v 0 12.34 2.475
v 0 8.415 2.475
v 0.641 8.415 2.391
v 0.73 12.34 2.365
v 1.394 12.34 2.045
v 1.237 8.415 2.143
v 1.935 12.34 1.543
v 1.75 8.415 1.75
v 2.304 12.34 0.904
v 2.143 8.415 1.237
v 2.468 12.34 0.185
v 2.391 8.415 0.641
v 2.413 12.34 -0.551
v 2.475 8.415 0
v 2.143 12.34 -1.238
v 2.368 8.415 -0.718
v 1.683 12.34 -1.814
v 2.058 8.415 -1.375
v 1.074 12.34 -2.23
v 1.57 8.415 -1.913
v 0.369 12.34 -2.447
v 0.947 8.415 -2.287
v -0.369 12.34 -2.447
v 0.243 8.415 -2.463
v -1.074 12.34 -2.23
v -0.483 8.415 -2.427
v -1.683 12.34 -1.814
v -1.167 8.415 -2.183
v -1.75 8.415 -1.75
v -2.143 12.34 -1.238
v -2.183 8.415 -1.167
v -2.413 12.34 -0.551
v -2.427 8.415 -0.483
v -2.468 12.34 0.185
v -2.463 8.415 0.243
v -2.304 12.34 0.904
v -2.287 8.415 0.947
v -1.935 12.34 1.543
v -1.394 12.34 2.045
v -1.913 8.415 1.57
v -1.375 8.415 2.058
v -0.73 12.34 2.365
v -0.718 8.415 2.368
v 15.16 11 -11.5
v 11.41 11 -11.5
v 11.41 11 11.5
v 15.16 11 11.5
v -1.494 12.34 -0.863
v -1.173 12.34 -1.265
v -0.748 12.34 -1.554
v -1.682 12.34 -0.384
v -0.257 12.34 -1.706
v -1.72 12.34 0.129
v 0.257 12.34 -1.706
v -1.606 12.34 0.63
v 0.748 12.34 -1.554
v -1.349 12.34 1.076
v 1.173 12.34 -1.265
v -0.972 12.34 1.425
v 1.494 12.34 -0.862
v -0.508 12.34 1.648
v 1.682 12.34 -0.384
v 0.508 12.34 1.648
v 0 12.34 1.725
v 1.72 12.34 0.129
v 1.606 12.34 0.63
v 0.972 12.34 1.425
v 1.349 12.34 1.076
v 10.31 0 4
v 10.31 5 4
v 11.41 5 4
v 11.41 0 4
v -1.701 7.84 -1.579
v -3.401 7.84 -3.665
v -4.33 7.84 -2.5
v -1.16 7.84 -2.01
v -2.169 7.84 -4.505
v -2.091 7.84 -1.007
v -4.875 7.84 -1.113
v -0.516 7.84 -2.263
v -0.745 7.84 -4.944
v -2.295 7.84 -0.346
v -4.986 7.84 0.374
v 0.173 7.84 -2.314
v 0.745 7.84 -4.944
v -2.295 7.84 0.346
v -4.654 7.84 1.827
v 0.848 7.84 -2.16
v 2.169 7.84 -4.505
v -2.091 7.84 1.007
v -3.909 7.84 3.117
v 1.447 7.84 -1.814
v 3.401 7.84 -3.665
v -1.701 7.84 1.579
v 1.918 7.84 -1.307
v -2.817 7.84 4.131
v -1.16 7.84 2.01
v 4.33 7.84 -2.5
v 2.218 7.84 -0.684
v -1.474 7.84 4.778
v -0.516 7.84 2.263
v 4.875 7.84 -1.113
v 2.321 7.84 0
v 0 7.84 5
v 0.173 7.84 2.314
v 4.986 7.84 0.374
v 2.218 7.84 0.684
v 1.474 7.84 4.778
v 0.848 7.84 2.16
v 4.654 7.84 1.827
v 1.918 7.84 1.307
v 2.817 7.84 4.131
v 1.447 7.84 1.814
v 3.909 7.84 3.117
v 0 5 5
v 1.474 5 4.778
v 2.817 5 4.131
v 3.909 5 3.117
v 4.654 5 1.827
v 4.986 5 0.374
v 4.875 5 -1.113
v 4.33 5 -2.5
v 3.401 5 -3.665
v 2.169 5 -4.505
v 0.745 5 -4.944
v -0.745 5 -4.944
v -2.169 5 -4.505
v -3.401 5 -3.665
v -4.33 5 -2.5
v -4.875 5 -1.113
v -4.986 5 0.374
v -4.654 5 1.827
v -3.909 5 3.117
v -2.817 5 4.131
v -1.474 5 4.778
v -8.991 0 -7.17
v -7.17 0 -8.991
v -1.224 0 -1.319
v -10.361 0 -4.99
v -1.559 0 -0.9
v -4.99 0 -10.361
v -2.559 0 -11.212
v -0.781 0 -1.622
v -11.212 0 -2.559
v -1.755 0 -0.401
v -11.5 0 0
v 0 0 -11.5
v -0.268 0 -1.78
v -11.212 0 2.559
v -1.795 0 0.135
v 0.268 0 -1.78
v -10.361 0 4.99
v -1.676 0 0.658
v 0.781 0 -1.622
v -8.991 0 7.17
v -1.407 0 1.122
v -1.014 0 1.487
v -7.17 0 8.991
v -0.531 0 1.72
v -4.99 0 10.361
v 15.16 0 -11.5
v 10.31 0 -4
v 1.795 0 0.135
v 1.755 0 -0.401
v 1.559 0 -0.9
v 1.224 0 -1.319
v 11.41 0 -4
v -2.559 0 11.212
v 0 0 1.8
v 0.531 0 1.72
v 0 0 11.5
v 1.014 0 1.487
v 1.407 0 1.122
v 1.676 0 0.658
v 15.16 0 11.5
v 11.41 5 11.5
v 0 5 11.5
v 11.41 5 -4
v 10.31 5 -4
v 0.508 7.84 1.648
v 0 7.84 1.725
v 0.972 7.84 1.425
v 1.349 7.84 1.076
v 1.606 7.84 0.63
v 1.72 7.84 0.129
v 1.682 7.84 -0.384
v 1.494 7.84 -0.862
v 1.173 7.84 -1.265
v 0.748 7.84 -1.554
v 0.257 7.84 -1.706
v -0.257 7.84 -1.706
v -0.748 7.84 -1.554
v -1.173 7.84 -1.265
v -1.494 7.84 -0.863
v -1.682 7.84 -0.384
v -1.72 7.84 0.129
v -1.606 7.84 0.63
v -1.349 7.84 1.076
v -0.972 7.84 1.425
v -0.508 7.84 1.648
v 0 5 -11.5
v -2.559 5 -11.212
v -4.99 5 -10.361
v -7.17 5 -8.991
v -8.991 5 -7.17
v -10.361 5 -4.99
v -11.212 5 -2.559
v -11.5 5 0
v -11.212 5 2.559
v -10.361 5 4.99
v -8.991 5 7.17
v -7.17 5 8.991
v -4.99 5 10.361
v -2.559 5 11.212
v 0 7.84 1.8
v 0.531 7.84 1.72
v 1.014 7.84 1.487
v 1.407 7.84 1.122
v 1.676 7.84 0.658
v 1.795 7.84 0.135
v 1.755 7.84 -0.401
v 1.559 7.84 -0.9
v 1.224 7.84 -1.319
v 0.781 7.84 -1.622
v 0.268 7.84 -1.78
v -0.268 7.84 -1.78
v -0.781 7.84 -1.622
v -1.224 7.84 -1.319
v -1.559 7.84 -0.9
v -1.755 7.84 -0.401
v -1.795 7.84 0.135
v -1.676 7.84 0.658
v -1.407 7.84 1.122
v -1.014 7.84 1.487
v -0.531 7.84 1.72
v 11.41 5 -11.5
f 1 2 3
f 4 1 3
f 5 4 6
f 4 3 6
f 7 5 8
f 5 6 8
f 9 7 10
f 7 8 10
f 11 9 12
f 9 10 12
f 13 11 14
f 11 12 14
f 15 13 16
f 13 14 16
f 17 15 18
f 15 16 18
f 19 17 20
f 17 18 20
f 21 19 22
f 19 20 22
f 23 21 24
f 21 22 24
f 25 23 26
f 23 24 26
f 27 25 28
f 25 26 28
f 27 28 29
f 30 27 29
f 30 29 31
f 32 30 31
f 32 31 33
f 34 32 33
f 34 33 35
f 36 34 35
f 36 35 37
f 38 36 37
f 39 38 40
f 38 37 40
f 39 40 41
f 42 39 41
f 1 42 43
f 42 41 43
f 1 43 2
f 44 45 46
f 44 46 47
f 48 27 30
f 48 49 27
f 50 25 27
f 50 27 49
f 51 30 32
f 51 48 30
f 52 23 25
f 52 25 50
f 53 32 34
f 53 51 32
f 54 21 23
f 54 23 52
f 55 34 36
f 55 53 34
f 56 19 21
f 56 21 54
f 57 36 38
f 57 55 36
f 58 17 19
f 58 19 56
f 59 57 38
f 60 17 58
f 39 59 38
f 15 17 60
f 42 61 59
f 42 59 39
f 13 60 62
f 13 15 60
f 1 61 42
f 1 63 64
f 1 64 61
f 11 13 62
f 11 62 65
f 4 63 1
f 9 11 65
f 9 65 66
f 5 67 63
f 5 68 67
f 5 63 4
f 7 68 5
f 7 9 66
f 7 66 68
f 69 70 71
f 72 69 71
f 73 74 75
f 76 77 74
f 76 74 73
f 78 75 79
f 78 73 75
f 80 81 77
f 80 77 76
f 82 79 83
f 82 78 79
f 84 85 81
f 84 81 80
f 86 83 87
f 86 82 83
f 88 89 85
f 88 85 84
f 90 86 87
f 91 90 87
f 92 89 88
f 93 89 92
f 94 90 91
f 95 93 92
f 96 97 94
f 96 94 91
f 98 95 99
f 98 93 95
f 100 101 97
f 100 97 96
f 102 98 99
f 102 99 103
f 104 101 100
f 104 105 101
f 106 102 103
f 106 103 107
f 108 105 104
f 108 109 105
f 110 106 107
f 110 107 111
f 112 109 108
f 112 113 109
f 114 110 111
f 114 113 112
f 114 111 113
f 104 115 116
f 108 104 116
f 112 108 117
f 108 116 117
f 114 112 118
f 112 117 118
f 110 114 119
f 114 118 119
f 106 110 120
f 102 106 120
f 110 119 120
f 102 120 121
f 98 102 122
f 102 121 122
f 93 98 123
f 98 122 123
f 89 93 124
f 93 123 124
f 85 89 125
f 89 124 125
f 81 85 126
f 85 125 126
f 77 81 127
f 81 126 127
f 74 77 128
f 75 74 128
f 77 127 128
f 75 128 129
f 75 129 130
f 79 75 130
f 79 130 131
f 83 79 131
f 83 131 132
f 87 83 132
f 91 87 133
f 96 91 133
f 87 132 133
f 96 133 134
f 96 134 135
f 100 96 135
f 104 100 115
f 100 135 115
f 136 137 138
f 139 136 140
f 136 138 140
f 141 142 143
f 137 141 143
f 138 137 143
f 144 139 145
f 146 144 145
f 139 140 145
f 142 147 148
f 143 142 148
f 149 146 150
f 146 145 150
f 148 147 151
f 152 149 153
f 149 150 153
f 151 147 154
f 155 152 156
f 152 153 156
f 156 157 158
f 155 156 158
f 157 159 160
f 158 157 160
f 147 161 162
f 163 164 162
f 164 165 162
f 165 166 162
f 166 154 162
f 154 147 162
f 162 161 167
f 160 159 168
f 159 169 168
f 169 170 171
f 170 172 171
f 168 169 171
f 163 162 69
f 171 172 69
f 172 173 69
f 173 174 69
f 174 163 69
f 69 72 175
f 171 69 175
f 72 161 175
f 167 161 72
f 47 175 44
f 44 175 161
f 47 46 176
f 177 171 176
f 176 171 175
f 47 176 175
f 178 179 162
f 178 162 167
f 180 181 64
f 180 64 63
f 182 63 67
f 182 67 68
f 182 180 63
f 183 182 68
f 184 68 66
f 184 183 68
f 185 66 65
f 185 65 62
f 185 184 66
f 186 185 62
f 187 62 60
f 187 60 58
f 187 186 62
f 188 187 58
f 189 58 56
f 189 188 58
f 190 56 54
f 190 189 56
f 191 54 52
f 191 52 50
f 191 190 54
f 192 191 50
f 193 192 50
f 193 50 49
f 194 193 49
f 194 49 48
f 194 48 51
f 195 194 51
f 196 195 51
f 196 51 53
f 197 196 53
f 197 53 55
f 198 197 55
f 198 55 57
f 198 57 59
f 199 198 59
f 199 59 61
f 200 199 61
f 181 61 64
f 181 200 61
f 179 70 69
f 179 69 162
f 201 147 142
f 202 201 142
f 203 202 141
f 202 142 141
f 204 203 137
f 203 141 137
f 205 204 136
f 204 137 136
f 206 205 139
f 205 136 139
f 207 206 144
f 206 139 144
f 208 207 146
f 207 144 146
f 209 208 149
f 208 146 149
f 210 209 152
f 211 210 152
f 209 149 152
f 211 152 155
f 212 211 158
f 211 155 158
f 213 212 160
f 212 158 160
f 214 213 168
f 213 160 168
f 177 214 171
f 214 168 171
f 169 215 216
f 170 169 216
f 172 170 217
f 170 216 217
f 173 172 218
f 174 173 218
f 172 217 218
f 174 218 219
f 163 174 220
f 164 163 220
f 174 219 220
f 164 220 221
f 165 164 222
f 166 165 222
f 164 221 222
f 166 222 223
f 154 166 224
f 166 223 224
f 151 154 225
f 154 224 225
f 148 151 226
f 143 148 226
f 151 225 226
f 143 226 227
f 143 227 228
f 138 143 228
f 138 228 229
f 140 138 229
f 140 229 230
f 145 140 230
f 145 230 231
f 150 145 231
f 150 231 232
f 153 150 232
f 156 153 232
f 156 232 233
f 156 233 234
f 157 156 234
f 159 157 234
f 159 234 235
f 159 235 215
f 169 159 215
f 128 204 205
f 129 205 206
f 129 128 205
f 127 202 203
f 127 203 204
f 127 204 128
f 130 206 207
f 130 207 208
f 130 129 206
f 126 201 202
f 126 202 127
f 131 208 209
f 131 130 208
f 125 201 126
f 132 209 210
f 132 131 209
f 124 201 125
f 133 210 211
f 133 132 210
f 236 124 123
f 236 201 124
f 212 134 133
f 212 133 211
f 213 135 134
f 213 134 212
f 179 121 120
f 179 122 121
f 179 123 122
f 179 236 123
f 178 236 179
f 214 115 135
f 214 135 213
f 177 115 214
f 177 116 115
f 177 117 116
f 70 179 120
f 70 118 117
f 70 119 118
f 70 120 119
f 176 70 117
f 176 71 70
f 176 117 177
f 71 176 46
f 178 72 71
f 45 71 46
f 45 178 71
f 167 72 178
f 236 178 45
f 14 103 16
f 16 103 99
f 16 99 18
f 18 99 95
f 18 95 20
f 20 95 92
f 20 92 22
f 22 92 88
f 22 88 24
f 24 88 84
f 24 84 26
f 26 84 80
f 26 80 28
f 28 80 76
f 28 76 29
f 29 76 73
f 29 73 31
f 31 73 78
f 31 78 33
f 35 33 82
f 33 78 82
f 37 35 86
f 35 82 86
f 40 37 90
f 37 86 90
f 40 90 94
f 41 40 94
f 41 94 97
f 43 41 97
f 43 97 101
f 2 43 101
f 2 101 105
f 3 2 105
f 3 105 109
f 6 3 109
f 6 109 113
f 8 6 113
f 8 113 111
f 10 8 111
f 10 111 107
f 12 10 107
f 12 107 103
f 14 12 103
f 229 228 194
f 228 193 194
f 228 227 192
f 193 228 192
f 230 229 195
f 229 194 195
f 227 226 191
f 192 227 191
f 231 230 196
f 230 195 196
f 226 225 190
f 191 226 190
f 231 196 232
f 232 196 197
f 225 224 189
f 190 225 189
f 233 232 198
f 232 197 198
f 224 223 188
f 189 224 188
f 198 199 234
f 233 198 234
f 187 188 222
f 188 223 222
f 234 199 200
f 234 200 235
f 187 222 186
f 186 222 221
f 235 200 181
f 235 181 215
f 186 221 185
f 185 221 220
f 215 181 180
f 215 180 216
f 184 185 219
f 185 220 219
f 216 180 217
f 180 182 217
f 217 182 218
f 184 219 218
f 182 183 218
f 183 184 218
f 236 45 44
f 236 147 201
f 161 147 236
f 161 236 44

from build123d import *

# Parameters (mm, degrees)
SKETCH1_R           = 11.5
BOSS_EXTRUDE1_DEPTH = 5
SKETCH2_R           = 5
BOSS_EXTRUDE2_DEPTH = 2.84
SKETCH3_R           = 2.475
SKETCH3_R_2         = 1.725
BOSS_EXTRUDE3_DEPTH = 4.5
SKETCH4_R           = 1.8
CUT_EXTRUDE1_DEPTH  = 8.84
SKETCH5_OUTSIDE_W   = 33.03
SKETCH5_OUTSIDE_H   = 33.03
SKETCH5_OUTSIDE_R   = 2.320799334
CUT_EXTRUDE2_DEPTH  = 2
CUT_EXTRUDE2_DRAFT  = 15
BOSS_EXTRUDE4_DEPTH = 5
SKETCH7_W           = 1.1
SKETCH7_H           = 8
CUT_EXTRUDE3_DEPTH  = 10
SKETCH10_W          = 3.75
SKETCH10_H          = 23
BOSS_EXTRUDE5_DEPTH = 6


with BuildPart() as part:
    # Sketch1 → Boss-Extrude1 (new body)
    with BuildSketch(Plane(origin=(0, 0, 0), x_dir=(1, 0, 0), z_dir=(0, 1, 0))):
        with Locations(Location((0, 0, 0), (0, 0, 270))):  # turned: the seam where the file's is
            Circle(SKETCH1_R)
    extrude(amount=BOSS_EXTRUDE1_DEPTH)

    # Sketch2 → Boss-Extrude2 (add)
    with BuildSketch(Plane(origin=(0, 5, 0), x_dir=(1, 0, 0), z_dir=(0, 1, 0))):
        with Locations(Location((0, 0, 0), (0, 0, 270))):  # turned: the seam where the file's is
            Circle(SKETCH2_R)
    extrude(amount=BOSS_EXTRUDE2_DEPTH)

    # Sketch3 → Boss-Extrude3 (add)
    with BuildSketch(Plane(origin=(0, 7.84, 0), x_dir=(1, 0, 0), z_dir=(0, 1, 0))):
        with Locations(Location((0, 0, 0), (0, 0, 270))):  # turned: the seam where the file's is
            Circle(SKETCH3_R)
        with Locations(Location((0, 0, 0), (0, 0, 270))):  # turned: the seam where the file's is
            Circle(SKETCH3_R_2, mode=Mode.SUBTRACT)
    extrude(amount=BOSS_EXTRUDE3_DEPTH)

    # Sketch4 → Cut-Extrude1 (cut, through all)
    with BuildSketch(Plane(origin=(0, 7.84, 0), x_dir=(1, 0, 0), z_dir=(0, 1, 0))):
        with Locations(Location((0, 0, 0), (0, 0, 270))):  # turned: the seam where the file's is
            Circle(SKETCH4_R)
    extrude(amount=-CUT_EXTRUDE1_DEPTH, mode=Mode.SUBTRACT)


with BuildPart() as cut_extrude2_tool:
    # Sketch5 outside → Cut-Extrude2 (with draft: the straight prism first)
    with BuildSketch(Plane(origin=(0, 7.84, 0), x_dir=(1, 0, 0), z_dir=(0, 1, 0))):
        Rectangle(SKETCH5_OUTSIDE_W, SKETCH5_OUTSIDE_H)
        Circle(SKETCH5_OUTSIDE_R, mode=Mode.SUBTRACT)
    extrude(amount=CUT_EXTRUDE2_DEPTH)
    # Cut-Extrude2: the draft: its side faces are tilted about the plane it starts from
    cut_extrude2_sides = [cut_extrude2_tool.faces().sort_by_distance(p)[0] for p in [
        (0, 8.84, 16.515),
        (16.515, 8.84, 0),
        (0, 8.84, -16.515),
        (-16.515, 8.84, 0),
        (-2.320799334, 8.84, 0),
    ]]
    draft(cut_extrude2_sides, Plane(origin=(0, 7.84, 0), x_dir=(1, 0, 0), z_dir=(0, 1, 0)), CUT_EXTRUDE2_DRAFT)


with BuildPart() as part_1:
    add(part.part)

    # Cut-Extrude2: cut by cut_extrude2_tool
    add(cut_extrude2_tool.part, mode=Mode.SUBTRACT)

    # Sketch6 → Boss-Extrude4 (add)
    with BuildSketch(Plane.XZ):
        with BuildLine():
            Line((0, -10.147230248), (0, -11.5))
            Line((0, -11.5), (15.160269884, -11.5))
            Line((15.160269884, -11.5), (15.160269884, 11.5))
            Line((15.160269884, 11.5), (0, 11.5))
            Line((0, 11.5), (0, 10.147230248))
            ThreePointArc((0, 10.147230248), (10.147230248, 0), (0, -10.147230248))
        make_face()
    extrude(amount=-BOSS_EXTRUDE4_DEPTH)

    # Sketch7 → Cut-Extrude3 (cut)
    with BuildSketch(Plane(origin=(0, 5, 0), x_dir=(1, 0, 0), z_dir=(0, 1, 0))):
        with Locations((10.860269884, 0)):
            Rectangle(SKETCH7_W, SKETCH7_H)
    extrude(amount=-CUT_EXTRUDE3_DEPTH, mode=Mode.SUBTRACT)

    # Sketch10 → Boss-Extrude5 (add)
    with BuildSketch(Plane(origin=(0, 5, 0), x_dir=(1, 0, 0), z_dir=(0, 1, 0))):
        with Locations((13.285269884, 0)):
            Rectangle(SKETCH10_W, SKETCH10_H)
    extrude(amount=BOSS_EXTRUDE5_DEPTH)


solid = part_1.part
